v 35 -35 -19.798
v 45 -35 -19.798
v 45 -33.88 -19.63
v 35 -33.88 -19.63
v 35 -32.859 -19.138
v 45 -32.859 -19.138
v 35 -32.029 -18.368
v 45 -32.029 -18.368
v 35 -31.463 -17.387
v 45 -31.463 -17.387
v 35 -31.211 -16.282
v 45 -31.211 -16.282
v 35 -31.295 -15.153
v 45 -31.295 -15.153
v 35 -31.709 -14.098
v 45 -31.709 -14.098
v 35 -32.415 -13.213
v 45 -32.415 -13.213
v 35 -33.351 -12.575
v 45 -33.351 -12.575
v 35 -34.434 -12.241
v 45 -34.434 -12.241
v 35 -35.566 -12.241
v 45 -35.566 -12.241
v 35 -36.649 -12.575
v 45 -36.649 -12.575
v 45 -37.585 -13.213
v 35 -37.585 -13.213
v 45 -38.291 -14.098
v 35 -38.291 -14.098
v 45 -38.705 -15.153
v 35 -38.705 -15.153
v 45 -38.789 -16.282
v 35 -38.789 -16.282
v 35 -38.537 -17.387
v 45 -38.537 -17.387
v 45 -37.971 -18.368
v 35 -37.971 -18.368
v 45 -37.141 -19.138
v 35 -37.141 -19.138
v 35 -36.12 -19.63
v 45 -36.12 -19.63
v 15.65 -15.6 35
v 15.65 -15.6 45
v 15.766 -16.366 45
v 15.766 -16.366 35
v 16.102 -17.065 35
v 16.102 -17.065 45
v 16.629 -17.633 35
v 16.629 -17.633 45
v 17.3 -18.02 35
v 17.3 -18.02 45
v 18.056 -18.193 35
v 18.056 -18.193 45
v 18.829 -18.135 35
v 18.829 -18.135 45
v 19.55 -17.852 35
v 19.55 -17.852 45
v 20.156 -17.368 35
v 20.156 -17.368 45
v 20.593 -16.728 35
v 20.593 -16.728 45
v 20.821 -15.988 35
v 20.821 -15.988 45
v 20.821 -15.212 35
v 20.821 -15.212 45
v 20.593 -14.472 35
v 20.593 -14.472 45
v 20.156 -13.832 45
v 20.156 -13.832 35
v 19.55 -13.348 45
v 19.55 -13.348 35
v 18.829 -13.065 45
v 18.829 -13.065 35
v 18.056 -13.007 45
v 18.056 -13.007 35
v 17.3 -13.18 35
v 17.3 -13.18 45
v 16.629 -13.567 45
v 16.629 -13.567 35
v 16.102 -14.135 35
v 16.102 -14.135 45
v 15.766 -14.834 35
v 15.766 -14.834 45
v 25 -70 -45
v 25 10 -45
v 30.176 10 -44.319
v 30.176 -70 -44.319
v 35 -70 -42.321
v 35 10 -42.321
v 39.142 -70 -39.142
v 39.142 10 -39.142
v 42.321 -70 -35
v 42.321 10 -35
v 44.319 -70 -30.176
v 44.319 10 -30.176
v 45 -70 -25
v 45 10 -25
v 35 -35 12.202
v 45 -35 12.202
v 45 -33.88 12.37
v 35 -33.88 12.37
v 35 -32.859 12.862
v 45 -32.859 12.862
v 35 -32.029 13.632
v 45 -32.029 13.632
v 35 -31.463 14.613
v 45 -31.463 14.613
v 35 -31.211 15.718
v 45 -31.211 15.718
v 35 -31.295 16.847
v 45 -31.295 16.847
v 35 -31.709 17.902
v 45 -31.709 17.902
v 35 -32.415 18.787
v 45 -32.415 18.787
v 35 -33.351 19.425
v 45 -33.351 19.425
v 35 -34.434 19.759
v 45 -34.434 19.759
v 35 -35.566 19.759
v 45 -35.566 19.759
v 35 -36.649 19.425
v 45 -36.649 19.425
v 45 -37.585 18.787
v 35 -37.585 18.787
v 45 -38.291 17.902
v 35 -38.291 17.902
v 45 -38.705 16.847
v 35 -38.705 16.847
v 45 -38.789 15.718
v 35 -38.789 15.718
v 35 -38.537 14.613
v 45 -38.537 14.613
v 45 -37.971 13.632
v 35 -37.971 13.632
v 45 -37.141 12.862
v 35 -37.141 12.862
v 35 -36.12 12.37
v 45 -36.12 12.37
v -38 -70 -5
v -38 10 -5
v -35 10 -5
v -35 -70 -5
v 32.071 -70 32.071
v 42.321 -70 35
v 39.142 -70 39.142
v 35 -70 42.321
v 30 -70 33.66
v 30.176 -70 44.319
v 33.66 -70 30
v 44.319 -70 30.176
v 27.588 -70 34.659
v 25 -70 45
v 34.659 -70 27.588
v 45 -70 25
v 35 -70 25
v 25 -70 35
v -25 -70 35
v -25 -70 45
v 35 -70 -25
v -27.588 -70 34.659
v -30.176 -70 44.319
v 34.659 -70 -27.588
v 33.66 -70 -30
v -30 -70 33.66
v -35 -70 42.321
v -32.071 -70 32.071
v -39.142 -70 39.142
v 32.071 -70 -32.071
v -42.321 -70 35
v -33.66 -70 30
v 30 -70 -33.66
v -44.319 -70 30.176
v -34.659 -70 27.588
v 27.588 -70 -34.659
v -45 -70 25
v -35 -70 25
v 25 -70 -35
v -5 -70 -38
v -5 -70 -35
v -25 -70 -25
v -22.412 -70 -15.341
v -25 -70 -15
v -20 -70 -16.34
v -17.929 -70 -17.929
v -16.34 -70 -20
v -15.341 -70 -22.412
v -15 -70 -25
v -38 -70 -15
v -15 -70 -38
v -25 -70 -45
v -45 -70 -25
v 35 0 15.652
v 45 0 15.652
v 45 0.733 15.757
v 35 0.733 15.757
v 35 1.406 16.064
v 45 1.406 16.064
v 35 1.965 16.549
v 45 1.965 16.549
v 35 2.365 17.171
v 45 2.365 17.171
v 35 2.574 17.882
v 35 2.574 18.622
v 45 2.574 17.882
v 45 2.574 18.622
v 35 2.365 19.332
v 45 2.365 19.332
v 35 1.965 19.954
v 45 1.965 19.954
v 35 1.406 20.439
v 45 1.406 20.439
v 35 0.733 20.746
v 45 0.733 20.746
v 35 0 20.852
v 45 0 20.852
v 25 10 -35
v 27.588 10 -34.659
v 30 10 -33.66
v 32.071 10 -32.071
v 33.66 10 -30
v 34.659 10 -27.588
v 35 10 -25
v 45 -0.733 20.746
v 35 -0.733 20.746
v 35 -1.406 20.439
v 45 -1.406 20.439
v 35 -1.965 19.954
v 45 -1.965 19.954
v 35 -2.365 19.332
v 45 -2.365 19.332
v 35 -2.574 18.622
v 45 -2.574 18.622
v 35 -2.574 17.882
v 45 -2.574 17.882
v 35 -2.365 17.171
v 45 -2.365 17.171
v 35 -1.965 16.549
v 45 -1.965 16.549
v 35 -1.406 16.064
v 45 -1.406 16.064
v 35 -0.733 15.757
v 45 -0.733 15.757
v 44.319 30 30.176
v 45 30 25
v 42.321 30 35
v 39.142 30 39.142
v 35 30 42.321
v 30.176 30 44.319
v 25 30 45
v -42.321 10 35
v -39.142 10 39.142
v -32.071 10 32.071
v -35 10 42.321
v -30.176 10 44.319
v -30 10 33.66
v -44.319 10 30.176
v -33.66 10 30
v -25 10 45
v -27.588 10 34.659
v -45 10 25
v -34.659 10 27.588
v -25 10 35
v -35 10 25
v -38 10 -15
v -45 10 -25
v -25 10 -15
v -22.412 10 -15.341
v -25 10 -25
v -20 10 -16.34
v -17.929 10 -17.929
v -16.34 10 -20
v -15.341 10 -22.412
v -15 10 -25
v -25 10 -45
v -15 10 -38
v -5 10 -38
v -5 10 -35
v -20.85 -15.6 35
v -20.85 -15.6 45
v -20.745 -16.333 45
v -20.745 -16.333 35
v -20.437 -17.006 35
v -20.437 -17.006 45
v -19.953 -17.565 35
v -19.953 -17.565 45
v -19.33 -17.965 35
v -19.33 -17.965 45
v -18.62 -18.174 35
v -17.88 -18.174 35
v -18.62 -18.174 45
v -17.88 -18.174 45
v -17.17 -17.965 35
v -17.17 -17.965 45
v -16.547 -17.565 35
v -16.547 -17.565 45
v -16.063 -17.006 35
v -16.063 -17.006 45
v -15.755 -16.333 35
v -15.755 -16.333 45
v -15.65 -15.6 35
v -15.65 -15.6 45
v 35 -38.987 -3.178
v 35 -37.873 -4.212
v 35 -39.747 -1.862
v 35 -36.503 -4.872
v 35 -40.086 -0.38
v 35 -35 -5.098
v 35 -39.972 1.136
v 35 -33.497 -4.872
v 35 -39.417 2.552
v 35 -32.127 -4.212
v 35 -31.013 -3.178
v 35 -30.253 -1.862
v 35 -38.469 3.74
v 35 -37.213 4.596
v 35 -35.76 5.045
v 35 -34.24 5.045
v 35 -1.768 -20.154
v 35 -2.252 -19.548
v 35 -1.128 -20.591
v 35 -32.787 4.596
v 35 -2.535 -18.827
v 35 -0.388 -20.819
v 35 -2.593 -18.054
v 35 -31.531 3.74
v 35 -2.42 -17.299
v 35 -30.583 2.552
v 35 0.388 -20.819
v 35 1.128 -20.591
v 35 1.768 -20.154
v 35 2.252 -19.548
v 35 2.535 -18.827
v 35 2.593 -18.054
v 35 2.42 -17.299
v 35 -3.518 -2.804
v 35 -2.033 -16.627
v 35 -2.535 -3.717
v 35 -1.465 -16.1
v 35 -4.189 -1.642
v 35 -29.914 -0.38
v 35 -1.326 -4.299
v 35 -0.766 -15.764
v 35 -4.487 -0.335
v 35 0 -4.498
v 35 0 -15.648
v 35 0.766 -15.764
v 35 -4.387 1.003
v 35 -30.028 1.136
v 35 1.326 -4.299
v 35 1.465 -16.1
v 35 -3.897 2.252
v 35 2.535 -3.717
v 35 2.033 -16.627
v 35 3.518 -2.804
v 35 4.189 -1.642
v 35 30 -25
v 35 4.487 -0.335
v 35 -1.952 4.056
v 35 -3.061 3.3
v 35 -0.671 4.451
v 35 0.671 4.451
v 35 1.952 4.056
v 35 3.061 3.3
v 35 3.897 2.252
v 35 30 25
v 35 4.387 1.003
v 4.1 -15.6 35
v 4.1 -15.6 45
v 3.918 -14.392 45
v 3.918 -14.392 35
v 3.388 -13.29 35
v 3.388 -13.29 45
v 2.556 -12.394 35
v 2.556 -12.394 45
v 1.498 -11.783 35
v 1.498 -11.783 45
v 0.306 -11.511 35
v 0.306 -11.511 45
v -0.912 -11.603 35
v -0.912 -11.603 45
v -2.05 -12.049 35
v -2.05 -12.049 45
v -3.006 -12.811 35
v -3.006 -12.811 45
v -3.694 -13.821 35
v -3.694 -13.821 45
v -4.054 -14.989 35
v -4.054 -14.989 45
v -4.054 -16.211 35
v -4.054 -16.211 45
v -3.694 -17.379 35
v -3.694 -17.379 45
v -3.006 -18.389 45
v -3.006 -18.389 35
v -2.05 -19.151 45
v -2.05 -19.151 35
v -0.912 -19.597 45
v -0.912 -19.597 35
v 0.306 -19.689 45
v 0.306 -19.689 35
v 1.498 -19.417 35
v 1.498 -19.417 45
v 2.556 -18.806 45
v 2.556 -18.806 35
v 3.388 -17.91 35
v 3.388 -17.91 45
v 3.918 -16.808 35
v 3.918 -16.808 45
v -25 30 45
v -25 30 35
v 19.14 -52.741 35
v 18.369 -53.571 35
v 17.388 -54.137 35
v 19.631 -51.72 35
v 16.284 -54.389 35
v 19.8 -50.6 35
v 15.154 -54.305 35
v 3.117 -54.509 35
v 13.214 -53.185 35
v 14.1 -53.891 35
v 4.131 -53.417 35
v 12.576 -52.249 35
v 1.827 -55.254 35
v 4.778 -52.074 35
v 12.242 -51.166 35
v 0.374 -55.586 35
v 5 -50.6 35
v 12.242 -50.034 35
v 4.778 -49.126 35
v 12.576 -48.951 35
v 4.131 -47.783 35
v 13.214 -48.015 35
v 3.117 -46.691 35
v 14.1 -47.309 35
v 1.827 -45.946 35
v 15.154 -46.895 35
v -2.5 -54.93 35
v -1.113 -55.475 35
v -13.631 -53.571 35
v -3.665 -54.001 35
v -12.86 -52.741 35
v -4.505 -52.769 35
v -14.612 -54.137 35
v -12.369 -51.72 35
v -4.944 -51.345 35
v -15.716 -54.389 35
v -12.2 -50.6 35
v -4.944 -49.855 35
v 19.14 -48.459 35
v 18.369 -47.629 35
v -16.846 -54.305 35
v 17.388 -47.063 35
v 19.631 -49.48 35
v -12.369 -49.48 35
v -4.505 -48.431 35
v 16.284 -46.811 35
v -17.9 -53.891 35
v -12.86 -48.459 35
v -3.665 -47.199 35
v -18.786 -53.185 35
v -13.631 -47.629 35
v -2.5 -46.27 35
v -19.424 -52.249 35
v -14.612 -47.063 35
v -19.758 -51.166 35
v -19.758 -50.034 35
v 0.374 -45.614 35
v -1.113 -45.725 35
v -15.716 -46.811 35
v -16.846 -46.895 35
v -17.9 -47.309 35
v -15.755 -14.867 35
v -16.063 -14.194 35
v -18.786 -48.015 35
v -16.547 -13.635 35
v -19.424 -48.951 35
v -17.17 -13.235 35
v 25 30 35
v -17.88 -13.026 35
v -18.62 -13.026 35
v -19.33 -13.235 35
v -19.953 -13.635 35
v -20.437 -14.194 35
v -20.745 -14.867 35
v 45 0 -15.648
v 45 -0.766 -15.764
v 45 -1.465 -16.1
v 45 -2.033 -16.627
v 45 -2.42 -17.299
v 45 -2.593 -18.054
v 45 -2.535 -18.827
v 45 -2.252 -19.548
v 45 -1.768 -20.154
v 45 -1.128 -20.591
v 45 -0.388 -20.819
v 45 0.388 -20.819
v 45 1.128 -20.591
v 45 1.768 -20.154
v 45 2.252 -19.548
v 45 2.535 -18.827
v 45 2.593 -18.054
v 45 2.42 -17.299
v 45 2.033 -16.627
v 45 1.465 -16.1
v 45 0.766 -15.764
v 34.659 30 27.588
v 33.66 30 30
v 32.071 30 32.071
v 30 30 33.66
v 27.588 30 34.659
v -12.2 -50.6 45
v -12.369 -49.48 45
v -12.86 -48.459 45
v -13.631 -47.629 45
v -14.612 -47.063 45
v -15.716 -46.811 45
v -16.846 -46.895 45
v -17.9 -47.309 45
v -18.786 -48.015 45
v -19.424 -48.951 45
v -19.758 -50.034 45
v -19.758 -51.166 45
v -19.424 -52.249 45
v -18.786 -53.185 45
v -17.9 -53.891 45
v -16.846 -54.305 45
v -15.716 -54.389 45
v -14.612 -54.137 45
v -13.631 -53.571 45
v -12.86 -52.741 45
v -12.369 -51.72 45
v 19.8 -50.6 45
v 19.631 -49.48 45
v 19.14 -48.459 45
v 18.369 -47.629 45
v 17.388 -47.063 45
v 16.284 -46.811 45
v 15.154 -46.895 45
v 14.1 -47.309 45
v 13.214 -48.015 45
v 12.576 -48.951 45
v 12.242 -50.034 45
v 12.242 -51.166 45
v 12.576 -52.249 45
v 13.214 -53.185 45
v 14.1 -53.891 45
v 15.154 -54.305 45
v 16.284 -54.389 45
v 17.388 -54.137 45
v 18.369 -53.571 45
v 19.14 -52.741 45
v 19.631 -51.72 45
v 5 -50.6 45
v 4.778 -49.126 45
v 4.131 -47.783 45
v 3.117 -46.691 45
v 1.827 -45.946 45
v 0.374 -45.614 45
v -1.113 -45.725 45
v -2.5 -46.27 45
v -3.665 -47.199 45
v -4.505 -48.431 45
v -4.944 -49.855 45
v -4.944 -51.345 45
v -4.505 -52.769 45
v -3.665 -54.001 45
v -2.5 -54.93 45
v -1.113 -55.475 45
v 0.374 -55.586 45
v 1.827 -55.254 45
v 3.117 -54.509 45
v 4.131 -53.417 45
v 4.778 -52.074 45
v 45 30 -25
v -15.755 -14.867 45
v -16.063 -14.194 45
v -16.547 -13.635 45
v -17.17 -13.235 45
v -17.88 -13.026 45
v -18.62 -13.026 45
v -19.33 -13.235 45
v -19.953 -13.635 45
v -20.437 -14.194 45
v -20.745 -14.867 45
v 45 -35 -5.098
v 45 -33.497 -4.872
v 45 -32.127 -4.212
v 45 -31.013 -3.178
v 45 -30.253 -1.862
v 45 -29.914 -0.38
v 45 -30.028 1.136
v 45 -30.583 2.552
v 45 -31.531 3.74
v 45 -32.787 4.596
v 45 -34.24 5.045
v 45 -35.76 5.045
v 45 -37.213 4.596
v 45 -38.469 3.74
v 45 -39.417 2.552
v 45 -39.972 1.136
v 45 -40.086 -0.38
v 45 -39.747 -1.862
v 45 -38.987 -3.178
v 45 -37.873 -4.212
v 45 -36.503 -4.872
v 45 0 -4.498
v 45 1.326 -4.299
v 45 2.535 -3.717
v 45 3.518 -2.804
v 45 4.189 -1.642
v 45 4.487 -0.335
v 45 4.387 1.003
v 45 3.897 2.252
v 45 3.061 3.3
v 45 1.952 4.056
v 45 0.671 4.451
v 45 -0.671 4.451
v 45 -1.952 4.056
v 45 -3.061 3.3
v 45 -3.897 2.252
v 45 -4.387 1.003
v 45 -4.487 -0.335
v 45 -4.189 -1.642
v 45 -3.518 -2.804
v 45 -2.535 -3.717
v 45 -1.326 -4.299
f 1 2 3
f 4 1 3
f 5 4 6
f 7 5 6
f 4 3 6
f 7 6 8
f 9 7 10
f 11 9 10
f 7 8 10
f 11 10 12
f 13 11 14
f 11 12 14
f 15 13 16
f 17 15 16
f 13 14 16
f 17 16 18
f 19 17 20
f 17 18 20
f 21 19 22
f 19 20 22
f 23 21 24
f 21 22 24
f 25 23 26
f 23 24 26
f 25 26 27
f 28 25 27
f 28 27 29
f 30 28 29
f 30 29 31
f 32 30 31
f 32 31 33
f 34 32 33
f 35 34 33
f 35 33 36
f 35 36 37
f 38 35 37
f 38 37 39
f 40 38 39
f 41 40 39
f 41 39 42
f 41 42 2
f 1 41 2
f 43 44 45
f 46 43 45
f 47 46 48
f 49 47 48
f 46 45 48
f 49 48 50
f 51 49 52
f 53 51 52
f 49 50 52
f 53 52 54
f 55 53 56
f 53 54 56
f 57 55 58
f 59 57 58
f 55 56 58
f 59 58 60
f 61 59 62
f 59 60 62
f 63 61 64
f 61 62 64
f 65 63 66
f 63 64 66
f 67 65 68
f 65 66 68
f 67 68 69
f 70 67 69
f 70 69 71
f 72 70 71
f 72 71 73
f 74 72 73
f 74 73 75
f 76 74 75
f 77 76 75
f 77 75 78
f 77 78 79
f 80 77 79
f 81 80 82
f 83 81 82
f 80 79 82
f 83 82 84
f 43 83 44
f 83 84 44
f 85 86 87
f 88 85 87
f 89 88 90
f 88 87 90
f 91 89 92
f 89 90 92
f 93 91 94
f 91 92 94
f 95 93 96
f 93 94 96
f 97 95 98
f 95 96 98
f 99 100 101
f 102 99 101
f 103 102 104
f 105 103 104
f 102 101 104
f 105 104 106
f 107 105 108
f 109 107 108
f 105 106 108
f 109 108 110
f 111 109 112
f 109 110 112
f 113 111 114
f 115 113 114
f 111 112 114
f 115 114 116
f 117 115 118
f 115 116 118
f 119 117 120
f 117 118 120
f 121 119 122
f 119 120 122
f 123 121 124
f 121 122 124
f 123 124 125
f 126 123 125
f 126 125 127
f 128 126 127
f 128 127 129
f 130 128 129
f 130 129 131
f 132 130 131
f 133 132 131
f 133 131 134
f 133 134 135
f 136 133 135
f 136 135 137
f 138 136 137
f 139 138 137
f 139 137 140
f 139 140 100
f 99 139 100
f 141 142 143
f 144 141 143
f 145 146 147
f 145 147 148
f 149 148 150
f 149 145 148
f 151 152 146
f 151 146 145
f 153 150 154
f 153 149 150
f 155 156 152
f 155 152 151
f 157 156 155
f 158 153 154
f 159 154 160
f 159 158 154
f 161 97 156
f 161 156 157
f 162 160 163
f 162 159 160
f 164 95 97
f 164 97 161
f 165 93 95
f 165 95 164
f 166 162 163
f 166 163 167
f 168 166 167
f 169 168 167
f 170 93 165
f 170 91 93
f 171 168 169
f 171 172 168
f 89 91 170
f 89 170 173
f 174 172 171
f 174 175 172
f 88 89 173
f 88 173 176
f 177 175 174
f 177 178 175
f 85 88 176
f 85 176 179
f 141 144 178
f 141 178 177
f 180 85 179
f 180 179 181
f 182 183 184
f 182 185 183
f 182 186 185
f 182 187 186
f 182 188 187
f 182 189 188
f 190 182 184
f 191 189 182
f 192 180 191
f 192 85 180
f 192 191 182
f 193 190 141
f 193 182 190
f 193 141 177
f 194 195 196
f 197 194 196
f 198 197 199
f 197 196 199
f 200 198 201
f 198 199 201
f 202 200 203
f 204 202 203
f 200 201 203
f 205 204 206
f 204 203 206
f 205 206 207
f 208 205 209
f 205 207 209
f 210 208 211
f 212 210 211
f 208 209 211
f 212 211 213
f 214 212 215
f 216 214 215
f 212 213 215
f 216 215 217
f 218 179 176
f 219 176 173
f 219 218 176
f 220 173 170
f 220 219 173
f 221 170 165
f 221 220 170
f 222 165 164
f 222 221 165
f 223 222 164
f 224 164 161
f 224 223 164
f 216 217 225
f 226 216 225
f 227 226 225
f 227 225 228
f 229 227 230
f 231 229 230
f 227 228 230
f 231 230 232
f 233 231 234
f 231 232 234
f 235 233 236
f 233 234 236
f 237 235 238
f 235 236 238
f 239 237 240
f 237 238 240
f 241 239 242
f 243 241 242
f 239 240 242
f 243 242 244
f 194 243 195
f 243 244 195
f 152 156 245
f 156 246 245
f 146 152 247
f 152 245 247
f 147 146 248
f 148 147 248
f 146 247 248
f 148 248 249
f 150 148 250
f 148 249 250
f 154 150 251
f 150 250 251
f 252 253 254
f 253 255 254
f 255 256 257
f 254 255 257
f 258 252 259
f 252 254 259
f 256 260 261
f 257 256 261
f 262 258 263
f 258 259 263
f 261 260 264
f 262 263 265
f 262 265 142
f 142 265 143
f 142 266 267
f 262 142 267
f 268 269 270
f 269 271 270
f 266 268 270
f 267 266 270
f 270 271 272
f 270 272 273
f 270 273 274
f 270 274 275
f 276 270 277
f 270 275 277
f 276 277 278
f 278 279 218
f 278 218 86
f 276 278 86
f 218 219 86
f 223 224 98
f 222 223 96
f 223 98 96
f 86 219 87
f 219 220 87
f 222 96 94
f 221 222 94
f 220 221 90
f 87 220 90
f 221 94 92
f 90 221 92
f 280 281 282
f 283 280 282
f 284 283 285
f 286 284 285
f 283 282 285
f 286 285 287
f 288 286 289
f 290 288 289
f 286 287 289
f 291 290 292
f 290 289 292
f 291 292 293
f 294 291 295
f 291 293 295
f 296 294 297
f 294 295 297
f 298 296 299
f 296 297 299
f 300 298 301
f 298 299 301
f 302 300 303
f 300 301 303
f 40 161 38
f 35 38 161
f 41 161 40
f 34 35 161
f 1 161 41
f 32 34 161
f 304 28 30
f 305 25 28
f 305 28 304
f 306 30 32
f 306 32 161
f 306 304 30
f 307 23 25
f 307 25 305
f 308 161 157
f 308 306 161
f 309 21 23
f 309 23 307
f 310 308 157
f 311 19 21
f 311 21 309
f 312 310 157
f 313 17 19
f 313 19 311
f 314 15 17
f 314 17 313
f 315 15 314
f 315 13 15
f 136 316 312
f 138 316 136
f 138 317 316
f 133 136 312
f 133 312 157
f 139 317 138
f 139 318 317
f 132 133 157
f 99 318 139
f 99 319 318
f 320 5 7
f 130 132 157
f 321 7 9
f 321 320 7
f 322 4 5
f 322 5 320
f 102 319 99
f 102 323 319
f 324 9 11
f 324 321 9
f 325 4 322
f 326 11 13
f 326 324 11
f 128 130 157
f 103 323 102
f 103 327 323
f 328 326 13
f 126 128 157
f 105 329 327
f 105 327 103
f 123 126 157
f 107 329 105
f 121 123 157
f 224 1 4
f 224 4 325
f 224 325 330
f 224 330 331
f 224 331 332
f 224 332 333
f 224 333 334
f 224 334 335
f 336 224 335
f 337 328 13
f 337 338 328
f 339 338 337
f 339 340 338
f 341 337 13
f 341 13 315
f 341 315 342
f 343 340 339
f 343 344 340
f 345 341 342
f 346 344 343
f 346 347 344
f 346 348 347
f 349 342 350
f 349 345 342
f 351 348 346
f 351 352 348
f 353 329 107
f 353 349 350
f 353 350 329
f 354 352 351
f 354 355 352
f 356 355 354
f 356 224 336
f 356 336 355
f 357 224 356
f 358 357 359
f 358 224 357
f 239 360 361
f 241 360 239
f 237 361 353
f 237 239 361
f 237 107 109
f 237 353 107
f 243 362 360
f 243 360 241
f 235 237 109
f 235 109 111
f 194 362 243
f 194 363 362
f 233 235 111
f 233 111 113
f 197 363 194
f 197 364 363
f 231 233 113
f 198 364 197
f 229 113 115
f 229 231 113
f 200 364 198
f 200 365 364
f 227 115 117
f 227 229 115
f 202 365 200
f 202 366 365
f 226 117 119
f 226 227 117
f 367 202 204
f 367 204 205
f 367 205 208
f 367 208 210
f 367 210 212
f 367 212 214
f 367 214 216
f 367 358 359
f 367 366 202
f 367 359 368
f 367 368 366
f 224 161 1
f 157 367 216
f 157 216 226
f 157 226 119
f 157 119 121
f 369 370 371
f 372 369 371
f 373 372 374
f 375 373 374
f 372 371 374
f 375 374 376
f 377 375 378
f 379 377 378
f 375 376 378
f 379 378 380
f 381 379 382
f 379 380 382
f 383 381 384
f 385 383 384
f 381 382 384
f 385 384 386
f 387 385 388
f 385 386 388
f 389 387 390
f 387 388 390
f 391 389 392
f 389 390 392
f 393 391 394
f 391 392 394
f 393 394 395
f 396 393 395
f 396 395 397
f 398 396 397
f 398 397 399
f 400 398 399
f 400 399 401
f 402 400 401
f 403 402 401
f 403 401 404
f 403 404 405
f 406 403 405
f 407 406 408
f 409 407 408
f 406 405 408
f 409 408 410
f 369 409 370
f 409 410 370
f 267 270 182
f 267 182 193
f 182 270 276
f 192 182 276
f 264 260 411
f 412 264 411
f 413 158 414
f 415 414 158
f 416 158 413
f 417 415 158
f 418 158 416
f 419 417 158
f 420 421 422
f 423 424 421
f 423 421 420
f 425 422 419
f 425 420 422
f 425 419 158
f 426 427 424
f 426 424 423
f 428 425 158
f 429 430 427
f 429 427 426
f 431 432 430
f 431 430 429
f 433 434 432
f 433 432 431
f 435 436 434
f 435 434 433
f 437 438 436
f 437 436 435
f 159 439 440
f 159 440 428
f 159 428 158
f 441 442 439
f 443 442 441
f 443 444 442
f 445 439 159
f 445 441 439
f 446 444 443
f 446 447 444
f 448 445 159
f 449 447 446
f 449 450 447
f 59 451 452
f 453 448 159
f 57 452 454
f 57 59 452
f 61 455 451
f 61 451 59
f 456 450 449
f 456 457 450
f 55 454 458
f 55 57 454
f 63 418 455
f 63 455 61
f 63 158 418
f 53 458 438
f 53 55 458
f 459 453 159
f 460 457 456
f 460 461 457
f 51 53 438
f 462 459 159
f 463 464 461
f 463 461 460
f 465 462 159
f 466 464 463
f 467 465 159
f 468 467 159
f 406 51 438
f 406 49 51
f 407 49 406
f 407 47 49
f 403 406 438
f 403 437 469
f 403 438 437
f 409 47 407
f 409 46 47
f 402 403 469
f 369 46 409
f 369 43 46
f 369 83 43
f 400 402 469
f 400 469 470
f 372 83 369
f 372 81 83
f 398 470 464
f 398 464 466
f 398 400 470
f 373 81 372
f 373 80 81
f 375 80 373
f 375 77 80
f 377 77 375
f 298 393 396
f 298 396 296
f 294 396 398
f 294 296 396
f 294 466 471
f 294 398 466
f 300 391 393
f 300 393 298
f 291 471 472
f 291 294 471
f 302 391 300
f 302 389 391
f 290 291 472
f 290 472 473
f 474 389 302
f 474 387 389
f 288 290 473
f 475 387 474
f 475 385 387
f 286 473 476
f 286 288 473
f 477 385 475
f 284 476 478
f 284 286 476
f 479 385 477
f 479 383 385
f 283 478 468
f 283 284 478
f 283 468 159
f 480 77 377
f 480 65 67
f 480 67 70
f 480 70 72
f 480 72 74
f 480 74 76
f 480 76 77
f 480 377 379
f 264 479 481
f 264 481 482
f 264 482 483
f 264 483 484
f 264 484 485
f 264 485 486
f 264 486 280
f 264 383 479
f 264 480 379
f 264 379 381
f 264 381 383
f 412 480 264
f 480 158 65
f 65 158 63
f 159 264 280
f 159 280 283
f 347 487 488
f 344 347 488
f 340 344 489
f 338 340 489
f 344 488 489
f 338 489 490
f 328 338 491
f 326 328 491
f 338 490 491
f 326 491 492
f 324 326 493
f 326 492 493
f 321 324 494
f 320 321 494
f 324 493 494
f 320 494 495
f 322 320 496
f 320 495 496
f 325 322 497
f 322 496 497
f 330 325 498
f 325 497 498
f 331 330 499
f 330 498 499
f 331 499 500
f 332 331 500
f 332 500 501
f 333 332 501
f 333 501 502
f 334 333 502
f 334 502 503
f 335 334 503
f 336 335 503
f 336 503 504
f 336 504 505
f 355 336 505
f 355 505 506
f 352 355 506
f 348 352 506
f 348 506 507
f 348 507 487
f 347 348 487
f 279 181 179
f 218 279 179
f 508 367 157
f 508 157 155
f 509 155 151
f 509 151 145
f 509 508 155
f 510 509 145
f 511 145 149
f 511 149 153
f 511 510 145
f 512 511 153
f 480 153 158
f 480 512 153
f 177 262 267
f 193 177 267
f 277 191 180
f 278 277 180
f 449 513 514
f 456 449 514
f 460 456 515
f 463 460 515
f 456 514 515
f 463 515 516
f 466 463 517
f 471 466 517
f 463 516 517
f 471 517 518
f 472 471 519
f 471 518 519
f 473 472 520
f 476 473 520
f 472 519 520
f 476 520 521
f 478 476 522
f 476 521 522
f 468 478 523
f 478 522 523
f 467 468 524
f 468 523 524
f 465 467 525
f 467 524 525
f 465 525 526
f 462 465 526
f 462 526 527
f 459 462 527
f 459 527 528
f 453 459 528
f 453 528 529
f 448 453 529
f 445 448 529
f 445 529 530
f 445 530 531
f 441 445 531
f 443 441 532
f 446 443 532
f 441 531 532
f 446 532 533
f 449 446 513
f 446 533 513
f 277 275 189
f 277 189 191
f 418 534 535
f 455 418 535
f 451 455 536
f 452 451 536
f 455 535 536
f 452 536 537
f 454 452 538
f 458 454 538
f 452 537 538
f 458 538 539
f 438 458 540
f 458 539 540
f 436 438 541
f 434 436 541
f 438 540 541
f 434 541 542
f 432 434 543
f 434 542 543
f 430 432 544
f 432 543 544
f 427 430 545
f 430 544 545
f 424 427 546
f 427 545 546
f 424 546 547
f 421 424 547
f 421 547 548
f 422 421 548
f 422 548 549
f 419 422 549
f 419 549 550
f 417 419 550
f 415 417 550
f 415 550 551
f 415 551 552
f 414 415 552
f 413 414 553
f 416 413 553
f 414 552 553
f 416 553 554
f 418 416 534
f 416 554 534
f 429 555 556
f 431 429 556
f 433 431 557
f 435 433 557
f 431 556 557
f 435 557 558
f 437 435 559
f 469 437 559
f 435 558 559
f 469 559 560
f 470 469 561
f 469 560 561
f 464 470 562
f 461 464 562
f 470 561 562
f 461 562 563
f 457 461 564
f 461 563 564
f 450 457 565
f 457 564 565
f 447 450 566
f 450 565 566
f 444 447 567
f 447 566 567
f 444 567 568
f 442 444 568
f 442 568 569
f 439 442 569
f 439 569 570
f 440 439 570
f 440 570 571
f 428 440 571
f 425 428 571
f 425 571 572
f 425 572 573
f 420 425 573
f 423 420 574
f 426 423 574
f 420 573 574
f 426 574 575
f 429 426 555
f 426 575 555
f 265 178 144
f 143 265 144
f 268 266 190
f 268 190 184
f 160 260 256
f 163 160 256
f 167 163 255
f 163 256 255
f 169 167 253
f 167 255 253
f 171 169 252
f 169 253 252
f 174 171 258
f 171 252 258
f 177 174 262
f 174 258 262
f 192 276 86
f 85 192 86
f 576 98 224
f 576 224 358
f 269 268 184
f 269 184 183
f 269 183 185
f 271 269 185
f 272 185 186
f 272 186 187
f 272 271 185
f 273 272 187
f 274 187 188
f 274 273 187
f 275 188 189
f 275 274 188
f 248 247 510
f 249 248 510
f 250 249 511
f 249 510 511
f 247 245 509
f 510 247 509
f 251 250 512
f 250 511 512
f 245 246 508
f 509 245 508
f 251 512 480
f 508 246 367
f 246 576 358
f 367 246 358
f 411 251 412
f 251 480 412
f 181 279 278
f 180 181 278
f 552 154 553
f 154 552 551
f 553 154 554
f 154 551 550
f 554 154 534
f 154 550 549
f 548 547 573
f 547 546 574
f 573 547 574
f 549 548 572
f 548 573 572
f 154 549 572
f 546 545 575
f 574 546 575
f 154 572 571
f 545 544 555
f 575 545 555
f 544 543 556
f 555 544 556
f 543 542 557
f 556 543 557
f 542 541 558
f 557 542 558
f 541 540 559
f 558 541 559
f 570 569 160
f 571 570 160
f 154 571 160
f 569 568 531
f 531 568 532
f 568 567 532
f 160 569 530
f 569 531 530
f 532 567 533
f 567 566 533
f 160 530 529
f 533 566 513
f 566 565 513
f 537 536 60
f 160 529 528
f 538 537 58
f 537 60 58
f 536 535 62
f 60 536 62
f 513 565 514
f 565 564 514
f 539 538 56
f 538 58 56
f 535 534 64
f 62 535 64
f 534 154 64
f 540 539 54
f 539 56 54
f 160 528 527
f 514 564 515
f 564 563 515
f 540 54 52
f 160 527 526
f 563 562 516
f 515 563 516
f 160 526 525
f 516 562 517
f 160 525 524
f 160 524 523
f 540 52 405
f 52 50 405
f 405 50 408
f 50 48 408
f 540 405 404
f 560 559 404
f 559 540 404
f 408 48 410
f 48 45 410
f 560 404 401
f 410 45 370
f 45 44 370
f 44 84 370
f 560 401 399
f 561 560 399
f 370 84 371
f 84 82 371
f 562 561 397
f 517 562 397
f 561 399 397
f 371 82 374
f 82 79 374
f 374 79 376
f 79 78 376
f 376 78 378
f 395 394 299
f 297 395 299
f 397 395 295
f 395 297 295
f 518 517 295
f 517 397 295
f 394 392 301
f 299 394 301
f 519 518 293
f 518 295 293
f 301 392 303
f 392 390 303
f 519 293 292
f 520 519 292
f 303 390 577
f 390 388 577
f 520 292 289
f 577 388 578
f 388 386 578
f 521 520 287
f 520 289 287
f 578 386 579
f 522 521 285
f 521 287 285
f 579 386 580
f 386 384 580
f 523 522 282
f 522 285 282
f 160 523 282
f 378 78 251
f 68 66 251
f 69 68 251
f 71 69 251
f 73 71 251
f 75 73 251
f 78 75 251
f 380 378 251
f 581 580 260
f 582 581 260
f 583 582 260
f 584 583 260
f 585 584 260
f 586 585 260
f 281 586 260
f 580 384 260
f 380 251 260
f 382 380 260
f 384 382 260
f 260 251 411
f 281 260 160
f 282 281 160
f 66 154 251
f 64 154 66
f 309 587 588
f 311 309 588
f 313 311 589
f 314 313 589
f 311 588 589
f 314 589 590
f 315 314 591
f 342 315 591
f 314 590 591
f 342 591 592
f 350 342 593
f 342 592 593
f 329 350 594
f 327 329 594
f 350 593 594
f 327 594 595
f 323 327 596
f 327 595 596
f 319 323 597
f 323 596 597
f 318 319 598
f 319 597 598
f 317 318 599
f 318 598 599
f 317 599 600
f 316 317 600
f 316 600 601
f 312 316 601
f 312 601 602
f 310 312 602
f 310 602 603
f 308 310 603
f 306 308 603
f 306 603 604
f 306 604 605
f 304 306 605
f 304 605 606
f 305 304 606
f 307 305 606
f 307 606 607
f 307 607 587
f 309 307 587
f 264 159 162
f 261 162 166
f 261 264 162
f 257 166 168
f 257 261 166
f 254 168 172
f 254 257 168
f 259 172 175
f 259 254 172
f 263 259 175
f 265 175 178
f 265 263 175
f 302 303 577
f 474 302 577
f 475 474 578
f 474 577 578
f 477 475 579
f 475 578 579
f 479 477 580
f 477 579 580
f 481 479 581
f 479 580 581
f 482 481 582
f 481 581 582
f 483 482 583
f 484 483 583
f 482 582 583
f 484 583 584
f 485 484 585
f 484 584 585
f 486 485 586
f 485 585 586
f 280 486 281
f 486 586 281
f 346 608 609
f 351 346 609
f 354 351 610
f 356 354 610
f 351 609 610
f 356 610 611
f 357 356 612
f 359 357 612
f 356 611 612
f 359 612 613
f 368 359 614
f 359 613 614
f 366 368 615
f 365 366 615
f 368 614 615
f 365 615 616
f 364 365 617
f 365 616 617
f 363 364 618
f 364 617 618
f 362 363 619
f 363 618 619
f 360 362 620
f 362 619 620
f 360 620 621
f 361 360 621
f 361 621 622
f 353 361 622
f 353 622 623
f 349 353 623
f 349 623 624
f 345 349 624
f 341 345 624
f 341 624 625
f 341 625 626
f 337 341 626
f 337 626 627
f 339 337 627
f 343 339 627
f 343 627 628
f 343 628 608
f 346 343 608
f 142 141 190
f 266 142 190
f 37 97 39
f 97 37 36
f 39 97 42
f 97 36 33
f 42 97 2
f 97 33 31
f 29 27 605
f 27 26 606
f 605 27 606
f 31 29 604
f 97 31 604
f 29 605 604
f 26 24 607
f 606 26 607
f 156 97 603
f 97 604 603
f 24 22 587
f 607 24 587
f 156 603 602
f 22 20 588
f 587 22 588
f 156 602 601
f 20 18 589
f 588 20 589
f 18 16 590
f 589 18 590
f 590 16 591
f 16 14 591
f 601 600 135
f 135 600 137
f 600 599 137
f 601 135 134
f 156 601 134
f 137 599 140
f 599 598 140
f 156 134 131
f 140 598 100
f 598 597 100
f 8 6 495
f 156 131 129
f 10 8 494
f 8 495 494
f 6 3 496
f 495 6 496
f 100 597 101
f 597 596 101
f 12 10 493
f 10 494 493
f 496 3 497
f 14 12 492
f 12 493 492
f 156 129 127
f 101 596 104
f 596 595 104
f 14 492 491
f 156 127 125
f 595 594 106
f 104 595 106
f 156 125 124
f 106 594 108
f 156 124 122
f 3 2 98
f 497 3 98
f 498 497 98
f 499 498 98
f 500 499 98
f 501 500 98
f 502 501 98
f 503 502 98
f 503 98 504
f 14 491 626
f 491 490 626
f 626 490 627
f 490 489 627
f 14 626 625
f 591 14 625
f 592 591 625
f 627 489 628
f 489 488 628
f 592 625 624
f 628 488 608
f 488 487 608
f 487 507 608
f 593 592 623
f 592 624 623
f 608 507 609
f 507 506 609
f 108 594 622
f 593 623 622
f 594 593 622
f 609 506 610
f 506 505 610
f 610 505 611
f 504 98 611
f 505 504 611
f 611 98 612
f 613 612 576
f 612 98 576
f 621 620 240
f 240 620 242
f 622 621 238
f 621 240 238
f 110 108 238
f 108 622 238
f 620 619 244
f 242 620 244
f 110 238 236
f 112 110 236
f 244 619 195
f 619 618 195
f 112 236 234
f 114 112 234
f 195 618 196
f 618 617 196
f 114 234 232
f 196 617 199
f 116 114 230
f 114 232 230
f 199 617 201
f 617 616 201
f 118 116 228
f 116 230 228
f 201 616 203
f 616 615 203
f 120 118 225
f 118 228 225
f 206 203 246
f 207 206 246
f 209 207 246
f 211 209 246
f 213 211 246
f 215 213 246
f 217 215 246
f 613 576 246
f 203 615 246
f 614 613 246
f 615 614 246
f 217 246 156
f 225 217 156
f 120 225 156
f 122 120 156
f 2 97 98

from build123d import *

# Parameters (mm, degrees)
BOSS_EXTRUDE1_DEPTH      = 30
BOSS_EXTRUDE1_DEPTH_BACK = 70
CUT_EXTRUDE1_REACH       = 92
SKETCH2_R                = 4.5
SKETCH2_R_2              = 5.1
SKETCH2_R_3              = 3.8
SKETCH5_W                = 20
SKETCH5_H                = 20
CUT_EXTRUDE2_DEPTH       = 91
CUT_EXTRUDE3_REACH       = 92
SKETCH7_W                = 20
SKETCH7_H                = 20
SKETCH8_R                = 5
SKETCH8_R_2              = 4.1
SKETCH8_R_3              = 3.8
CUT_EXTRUDE6_DEPTH       = 10
SKETCH9_W                = 20
SKETCH9_H                = 20
SKETCH9_W_2              = 3
SKETCH9_H_2              = 3
CUT_EXTRUDE7_DEPTH       = 81
BOSS_EXTRUDE2_DEPTH      = 80


with BuildPart() as part:
    # Sketch1 → Boss-Extrude1 (new body, two sides)
    with BuildSketch(Plane(origin=(0, 0, 0), x_dir=(1, 0, 0), z_dir=(0, 1, 0))) as boss_extrude1_sk:
        with BuildLine():
            Line((-25, 45), (25, 45))
            ThreePointArc((25, 45), (39.142135624, 39.142135624), (45, 25))
            Line((45, 25), (45, -25))
            ThreePointArc((45, -25), (39.142135624, -39.142135624), (25, -45))
            Line((25, -45), (-25, -45))
            ThreePointArc((-25, -45), (-39.142135624, -39.142135624), (-45, -25))
            Line((-45, -25), (-45, 25))
            ThreePointArc((-45, 25), (-39.142135624, 39.142135624), (-25, 45))
        make_face()
        with BuildLine():
            Line((-25, 35), (25, 35))
            ThreePointArc((25, 35), (32.071067812, 32.071067812), (35, 25))
            Line((35, 25), (35, -25))
            ThreePointArc((35, -25), (32.071067812, -32.071067812), (25, -35))
            Line((25, -35), (-25, -35))
            ThreePointArc((-25, -35), (-32.071067812, -32.071067812), (-35, -25))
            Line((-35, -25), (-35, 25))
            ThreePointArc((-35, 25), (-32.071067812, 32.071067812), (-25, 35))
        make_face(mode=Mode.SUBTRACT)
    extrude(amount=BOSS_EXTRUDE1_DEPTH)
    extrude(boss_extrude1_sk.sketch, amount=-BOSS_EXTRUDE1_DEPTH_BACK)

    # Sketch2 → Cut-Extrude1 (cut, up to next)
    with BuildSketch(Plane(origin=(45, 0, 0), x_dir=(0, 0, -1), z_dir=(1, 0, 0)), mode=Mode.PRIVATE) as cut_extrude1_sk1:
        with Locations((-0.001556395, 0)):
            Circle(SKETCH2_R)
    cut_extrude1_tool1 = extrude(cut_extrude1_sk1.sketch, amount=-CUT_EXTRUDE1_REACH, mode=Mode.PRIVATE) & part.part
    add(cut_extrude1_tool1.solids().sort_by_distance((45, 0, 0.001556))[0], mode=Mode.SUBTRACT)
    # Sketch2 → Cut-Extrude1 (cut, up to next)
    with BuildSketch(Plane(origin=(45, 0, 0), x_dir=(0, 0, -1), z_dir=(1, 0, 0)), mode=Mode.PRIVATE) as cut_extrude1_sk2:
        with Locations((-0.001556395, -35)):
            Circle(SKETCH2_R_2)
    cut_extrude1_tool2 = extrude(cut_extrude1_sk2.sketch, amount=-CUT_EXTRUDE1_REACH, mode=Mode.PRIVATE) & part.part
    add(cut_extrude1_tool2.solids().sort_by_distance((45, -35, 0.001556))[0], mode=Mode.SUBTRACT)
    # Sketch2 → Cut-Extrude1 (cut, up to next)
    with BuildSketch(Plane(origin=(45, 0, 0), x_dir=(0, 0, -1), z_dir=(1, 0, 0)), mode=Mode.PRIVATE) as cut_extrude1_sk3:
        with Locations((15.998443605, -35)):
            Circle(SKETCH2_R_3)
    cut_extrude1_tool3 = extrude(cut_extrude1_sk3.sketch, amount=-CUT_EXTRUDE1_REACH, mode=Mode.PRIVATE) & part.part
    add(cut_extrude1_tool3.solids().sort_by_distance((45, -35, -15.998444))[0], mode=Mode.SUBTRACT)
    # Sketch2 → Cut-Extrude1 (cut, up to next)
    with BuildSketch(Plane(origin=(45, 0, 0), x_dir=(0, 0, -1), z_dir=(1, 0, 0)), mode=Mode.PRIVATE) as cut_extrude1_sk4:
        with Locations((-16.001556395, -35)):
            Circle(SKETCH2_R_3)
    cut_extrude1_tool4 = extrude(cut_extrude1_sk4.sketch, amount=-CUT_EXTRUDE1_REACH, mode=Mode.PRIVATE) & part.part
    add(cut_extrude1_tool4.solids().sort_by_distance((45, -35, 16.001556))[0], mode=Mode.SUBTRACT)
    # Sketch2 → Cut-Extrude1 (cut, up to next)
    with BuildSketch(Plane(origin=(45, 0, 0), x_dir=(0, 0, -1), z_dir=(1, 0, 0)), mode=Mode.PRIVATE) as cut_extrude1_sk5:
        with BuildLine():
            ThreePointArc((20.848443603, 0), (18.248443605, 2.599999998), (15.648443602, 0))
            ThreePointArc((15.648443602, 0), (18.248443605, -2.600000003), (20.848443603, 0))
        make_face()
    cut_extrude1_tool5 = extrude(cut_extrude1_sk5.sketch, amount=-CUT_EXTRUDE1_REACH, mode=Mode.PRIVATE) & part.part
    add(cut_extrude1_tool5.solids().sort_by_distance((45, 0, -18.248444))[0], mode=Mode.SUBTRACT)
    # Sketch2 → Cut-Extrude1 (cut, up to next)
    with BuildSketch(Plane(origin=(45, 0, 0), x_dir=(0, 0, -1), z_dir=(1, 0, 0)), mode=Mode.PRIVATE) as cut_extrude1_sk6:
        with BuildLine():
            ThreePointArc((-15.651556392, 0), (-18.251556395, 2.600000003), (-20.851556393, 0))
            ThreePointArc((-20.851556393, 0), (-18.251556395, -2.599999997), (-15.651556392, 0))
        make_face()
    cut_extrude1_tool6 = extrude(cut_extrude1_sk6.sketch, amount=-CUT_EXTRUDE1_REACH, mode=Mode.PRIVATE) & part.part
    add(cut_extrude1_tool6.solids().sort_by_distance((45, 0, 18.251556))[0], mode=Mode.SUBTRACT)

    # Sketch5 → Cut-Extrude2 (cut, through all)
    with BuildSketch(Plane(origin=(45, 0, 0), x_dir=(0, 0, -1), z_dir=(1, 0, 0))):
        with Locations((35, 20)):
            Rectangle(SKETCH5_W, SKETCH5_H)
    extrude(amount=-CUT_EXTRUDE2_DEPTH, mode=Mode.SUBTRACT)

    # Sketch7 → Cut-Extrude3 (cut, up to next)
    with BuildSketch(Plane.XY.offset(45), mode=Mode.PRIVATE) as cut_extrude3_sk1:
        with Locations((-35, 20)):
            Rectangle(SKETCH7_W, SKETCH7_H)
    cut_extrude3_tool1 = extrude(cut_extrude3_sk1.sketch, amount=-CUT_EXTRUDE3_REACH, mode=Mode.PRIVATE) & part.part
    add(cut_extrude3_tool1.solids().sort_by_distance((-35, 20, 45))[0], mode=Mode.SUBTRACT)

    # Sketch8 → Cut-Extrude6 (cut)
    with BuildSketch(Plane.XY.offset(45)):
        with Locations((640, -50.6)):
            Circle(SKETCH8_R)
        with Locations((640, -15.6)):
            Circle(SKETCH8_R)
        with Locations((0, -15.6)):
            Circle(SKETCH8_R_2)
        with Locations((0, -50.6)):
            Circle(SKETCH8_R)
        with Locations((-16, -50.6)):
            Circle(SKETCH8_R_3)
        with Locations((16, -50.6)):
            Circle(SKETCH8_R_3)
        with BuildLine():
            ThreePointArc((-15.649999997, -15.6), (-18.25, -12.999999997), (-20.849999998, -15.6))
            ThreePointArc((-20.849999998, -15.6), (-18.25, -18.199999997), (-15.649999997, -15.6))
        make_face()
        with BuildLine():
            ThreePointArc((20.849999998, -15.6), (18.25, -13.000000002), (15.649999997, -15.6))
            ThreePointArc((15.649999997, -15.6), (18.25, -18.200000003), (20.849999998, -15.6))
        make_face()
    extrude(amount=-CUT_EXTRUDE6_DEPTH, mode=Mode.SUBTRACT)

    # Sketch9 → Cut-Extrude7 (cut, through all)
    with BuildSketch(Plane(origin=(0, 10, 0), x_dir=(1, 0, 0), z_dir=(0, 1, 0))):
        with Locations((-35, 35)):
            Rectangle(SKETCH9_W, SKETCH9_H)
        with Locations((-36.5, 15)):
            Rectangle(SKETCH9_W_2, SKETCH9_H)
        with Locations((-15, 36.5)):
            Rectangle(SKETCH9_W, SKETCH9_H_2)
    extrude(amount=-CUT_EXTRUDE7_DEPTH, mode=Mode.SUBTRACT)

    # Sketch10 → Boss-Extrude2 (add)
    with BuildSketch(Plane(origin=(0, 10, 0), x_dir=(1, 0, 0), z_dir=(0, 1, 0))):
        with BuildLine():
            Line((-25, 45), (-25, 25))
            Line((-25, 25), (-45, 25))
            Line((-45, 25), (-45, 15))
            Line((-45, 15), (-25, 15))
            ThreePointArc((-25, 15), (-17.928932188, 17.928932188), (-15, 25))
            Line((-15, 25), (-15, 45))
            Line((-15, 45), (-25, 45))
        make_face()
    extrude(amount=-BOSS_EXTRUDE2_DEPTH)


solid = part.part
